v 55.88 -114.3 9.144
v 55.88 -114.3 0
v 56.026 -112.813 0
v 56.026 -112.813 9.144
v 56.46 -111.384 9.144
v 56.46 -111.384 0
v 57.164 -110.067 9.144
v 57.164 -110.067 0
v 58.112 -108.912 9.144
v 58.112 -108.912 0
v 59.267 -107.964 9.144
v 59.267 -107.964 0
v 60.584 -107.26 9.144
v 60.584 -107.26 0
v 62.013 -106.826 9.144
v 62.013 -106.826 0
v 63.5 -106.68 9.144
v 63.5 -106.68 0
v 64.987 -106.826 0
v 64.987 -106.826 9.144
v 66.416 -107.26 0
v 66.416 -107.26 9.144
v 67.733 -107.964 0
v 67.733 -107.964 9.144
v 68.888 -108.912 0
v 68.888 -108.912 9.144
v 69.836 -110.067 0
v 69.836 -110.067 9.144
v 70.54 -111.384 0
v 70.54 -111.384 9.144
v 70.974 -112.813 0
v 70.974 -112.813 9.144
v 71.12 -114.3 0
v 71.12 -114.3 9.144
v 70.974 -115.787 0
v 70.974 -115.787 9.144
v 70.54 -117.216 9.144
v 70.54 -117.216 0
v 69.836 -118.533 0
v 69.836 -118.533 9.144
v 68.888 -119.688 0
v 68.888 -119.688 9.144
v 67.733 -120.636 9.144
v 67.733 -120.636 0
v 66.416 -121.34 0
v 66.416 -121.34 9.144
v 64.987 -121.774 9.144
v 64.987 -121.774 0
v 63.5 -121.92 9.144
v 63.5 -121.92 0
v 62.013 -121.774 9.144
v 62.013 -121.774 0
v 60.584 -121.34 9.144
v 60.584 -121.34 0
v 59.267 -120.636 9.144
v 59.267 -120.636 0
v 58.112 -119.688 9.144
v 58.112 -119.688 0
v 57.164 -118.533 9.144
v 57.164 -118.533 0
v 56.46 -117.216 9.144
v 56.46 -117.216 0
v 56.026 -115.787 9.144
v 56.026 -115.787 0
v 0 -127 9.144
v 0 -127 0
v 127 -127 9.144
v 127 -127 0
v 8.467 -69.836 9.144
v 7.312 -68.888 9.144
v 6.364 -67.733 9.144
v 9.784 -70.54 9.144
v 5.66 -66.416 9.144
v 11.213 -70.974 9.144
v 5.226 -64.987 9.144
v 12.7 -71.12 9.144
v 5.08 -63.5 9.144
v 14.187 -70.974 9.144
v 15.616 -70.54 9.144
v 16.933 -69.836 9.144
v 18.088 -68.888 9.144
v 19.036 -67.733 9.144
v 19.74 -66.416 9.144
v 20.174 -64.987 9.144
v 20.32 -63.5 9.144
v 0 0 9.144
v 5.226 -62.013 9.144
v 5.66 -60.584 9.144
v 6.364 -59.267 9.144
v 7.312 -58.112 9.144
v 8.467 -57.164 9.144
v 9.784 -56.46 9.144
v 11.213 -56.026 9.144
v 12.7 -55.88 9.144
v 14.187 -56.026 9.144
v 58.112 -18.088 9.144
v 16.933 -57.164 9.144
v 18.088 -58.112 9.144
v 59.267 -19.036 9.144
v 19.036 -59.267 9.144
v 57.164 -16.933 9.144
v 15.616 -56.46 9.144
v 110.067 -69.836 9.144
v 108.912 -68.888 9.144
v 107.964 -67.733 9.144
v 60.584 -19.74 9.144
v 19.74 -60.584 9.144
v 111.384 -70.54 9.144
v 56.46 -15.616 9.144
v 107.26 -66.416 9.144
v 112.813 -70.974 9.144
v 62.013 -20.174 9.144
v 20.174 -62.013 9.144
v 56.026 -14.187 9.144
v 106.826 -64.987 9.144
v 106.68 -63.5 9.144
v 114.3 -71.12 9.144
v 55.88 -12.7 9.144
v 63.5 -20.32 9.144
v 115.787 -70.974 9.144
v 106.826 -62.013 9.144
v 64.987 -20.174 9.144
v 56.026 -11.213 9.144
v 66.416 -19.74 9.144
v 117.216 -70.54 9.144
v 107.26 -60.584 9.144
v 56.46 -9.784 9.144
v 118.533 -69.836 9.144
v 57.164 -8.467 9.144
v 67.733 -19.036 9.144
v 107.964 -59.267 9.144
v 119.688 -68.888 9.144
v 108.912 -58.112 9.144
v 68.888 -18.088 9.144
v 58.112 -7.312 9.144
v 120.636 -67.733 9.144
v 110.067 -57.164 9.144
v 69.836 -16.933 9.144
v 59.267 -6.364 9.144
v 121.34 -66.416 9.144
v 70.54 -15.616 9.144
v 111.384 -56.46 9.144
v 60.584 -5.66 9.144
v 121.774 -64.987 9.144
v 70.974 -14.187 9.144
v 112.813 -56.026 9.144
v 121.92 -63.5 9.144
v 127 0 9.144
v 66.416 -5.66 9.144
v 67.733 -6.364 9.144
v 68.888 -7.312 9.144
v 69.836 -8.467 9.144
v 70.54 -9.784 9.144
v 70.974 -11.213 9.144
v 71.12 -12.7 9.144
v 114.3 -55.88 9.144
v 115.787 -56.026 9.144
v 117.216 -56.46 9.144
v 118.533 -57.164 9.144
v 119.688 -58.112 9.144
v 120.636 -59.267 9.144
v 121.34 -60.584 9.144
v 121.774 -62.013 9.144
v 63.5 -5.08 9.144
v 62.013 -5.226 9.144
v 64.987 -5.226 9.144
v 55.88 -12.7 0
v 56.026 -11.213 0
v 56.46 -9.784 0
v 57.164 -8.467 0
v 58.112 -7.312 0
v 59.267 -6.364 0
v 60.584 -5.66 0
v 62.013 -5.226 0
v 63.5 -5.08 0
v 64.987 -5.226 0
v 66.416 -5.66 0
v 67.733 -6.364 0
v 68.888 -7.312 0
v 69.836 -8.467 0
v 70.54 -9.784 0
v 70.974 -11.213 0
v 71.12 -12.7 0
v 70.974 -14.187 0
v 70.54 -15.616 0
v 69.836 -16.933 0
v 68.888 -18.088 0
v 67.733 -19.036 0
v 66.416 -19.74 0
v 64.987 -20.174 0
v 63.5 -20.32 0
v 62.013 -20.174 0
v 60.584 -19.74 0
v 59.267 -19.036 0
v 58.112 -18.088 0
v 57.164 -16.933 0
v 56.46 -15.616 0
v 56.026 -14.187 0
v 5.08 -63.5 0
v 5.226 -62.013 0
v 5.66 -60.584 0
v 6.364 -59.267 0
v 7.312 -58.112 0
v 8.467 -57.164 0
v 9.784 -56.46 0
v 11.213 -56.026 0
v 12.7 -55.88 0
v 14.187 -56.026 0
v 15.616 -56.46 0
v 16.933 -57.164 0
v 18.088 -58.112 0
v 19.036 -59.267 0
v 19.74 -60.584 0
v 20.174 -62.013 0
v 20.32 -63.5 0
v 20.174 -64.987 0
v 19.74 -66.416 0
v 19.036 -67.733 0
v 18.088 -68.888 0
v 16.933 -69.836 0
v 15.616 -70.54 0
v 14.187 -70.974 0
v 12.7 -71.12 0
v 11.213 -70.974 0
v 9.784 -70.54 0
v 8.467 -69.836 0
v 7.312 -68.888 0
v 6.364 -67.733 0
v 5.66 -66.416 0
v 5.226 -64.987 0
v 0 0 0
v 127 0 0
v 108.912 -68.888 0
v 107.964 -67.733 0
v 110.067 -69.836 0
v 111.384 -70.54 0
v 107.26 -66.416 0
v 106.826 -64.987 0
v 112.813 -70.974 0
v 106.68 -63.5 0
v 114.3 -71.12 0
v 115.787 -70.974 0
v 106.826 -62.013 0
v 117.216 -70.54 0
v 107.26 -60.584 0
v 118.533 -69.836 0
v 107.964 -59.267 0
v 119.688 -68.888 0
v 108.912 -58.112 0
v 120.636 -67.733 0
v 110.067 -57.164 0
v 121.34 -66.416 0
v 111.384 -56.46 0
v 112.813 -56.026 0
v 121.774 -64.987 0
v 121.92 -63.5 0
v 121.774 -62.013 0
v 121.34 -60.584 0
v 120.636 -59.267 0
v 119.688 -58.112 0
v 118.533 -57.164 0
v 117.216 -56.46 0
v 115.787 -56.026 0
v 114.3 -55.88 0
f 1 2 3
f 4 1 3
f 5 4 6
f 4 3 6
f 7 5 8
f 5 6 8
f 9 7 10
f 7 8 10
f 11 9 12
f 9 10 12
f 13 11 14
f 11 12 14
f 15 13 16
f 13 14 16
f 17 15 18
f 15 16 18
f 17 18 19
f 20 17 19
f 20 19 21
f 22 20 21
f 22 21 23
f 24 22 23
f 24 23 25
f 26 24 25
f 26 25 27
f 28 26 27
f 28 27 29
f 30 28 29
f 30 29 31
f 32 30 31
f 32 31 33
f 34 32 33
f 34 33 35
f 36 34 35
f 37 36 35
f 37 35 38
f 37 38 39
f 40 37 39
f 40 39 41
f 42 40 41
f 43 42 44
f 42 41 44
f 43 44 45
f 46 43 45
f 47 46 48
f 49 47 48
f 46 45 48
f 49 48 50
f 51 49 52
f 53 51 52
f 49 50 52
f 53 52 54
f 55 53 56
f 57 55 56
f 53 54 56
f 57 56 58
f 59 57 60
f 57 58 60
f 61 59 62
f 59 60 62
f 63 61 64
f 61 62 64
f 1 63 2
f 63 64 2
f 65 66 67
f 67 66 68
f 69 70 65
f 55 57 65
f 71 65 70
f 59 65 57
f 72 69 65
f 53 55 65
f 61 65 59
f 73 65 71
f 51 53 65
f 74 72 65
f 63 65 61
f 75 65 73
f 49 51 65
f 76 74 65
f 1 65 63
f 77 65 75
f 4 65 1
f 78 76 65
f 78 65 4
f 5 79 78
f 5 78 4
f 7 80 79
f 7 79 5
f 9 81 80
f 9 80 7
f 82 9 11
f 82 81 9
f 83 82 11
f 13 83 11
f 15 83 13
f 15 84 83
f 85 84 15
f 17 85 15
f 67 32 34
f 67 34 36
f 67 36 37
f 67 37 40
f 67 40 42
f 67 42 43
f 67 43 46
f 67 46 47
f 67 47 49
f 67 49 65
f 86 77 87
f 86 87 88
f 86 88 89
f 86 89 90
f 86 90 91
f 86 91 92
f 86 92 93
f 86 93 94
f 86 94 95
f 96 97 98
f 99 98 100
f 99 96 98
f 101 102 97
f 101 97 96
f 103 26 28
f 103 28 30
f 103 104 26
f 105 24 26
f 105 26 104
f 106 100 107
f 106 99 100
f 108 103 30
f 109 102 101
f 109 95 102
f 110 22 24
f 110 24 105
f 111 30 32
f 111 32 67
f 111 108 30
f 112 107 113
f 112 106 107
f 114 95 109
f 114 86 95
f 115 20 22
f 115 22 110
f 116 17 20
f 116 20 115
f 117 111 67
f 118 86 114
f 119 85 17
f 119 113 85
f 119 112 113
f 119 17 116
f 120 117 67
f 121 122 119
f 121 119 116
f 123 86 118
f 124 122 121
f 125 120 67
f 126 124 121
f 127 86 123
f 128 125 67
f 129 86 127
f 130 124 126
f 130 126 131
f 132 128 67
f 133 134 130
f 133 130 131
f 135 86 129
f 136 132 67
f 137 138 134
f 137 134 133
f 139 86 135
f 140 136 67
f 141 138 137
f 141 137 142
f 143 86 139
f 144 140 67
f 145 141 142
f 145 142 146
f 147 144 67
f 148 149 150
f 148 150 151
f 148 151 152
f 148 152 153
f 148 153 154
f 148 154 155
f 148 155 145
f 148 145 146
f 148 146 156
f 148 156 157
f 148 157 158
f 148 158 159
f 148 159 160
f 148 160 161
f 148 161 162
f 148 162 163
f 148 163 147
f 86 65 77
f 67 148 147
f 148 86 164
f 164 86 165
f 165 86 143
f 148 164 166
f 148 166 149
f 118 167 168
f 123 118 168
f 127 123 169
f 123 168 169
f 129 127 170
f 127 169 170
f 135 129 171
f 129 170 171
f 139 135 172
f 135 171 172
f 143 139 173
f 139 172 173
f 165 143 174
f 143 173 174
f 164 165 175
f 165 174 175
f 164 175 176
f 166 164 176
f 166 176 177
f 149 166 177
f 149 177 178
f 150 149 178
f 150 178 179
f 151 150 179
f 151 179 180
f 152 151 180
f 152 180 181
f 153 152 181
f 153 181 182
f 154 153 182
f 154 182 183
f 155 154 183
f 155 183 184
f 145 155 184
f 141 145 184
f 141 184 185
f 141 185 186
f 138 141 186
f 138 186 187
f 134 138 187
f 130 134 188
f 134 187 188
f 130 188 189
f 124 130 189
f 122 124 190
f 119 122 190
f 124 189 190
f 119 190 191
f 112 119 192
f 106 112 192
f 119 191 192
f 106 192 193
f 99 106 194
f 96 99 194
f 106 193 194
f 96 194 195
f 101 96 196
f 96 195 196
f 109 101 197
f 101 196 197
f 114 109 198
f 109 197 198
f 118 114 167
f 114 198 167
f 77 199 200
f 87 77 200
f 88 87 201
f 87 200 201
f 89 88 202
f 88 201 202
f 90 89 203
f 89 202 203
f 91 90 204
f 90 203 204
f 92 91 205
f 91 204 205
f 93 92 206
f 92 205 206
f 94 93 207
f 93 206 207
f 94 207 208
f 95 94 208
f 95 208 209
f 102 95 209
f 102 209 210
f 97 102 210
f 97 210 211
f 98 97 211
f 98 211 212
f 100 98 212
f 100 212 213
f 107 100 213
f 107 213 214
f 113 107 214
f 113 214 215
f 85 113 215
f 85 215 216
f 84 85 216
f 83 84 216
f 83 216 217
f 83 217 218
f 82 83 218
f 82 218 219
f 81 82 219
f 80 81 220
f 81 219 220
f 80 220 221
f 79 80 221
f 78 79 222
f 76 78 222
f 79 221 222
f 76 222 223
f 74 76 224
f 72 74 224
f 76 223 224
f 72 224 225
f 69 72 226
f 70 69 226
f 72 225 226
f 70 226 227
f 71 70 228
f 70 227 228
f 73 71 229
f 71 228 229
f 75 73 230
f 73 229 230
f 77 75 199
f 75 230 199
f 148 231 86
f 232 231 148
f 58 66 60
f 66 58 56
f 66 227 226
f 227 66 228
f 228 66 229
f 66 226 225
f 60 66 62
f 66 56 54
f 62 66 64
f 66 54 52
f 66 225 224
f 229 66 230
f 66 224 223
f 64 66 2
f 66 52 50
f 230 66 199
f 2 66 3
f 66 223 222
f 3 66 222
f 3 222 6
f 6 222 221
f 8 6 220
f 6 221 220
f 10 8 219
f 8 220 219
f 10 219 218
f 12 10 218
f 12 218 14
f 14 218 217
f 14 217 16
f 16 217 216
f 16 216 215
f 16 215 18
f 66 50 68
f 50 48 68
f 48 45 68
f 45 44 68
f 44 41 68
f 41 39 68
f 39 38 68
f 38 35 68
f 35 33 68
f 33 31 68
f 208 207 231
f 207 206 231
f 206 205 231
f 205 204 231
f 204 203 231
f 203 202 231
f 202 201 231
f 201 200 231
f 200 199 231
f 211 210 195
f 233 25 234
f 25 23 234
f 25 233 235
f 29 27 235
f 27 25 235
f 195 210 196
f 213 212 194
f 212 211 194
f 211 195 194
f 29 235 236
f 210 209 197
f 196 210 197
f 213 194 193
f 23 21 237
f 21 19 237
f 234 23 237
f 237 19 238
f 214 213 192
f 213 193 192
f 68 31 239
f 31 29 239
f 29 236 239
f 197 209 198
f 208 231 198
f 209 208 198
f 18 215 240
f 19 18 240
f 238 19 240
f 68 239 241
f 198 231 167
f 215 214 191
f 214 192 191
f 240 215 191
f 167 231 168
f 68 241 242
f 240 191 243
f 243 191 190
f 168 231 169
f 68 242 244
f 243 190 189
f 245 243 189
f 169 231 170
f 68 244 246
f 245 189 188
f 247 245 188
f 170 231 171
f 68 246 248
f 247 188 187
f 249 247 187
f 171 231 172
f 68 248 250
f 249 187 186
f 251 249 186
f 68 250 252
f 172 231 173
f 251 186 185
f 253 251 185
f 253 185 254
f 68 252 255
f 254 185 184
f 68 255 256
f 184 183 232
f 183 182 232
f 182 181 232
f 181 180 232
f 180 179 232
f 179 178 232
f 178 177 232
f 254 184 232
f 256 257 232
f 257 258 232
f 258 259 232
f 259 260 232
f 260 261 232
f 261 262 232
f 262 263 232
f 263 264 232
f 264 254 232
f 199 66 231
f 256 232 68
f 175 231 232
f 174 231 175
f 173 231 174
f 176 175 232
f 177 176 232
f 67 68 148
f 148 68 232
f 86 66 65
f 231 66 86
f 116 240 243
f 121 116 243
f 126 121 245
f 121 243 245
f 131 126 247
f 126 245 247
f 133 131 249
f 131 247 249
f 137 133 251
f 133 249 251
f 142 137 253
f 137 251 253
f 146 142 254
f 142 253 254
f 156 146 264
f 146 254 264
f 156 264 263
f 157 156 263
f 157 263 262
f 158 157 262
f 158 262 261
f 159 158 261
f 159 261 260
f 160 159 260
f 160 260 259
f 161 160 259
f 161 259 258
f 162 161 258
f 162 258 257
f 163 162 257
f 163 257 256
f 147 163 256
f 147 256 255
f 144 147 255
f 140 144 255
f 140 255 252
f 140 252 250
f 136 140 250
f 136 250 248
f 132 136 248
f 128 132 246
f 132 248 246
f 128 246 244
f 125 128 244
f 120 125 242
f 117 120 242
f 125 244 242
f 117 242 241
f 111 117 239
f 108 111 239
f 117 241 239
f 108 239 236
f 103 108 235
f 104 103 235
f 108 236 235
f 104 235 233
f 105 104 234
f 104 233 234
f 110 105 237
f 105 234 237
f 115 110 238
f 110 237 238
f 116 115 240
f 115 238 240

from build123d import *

# Parameters (mm, degrees)
F0_W           = 127
F0_H           = 127
F1_DEPTH       = 9.144
F3_D           = 15.24
F3_CBORE_D     = 15.24
F3_CBORE_DEPTH = 50.8
F4_D           = 15.24
F4_CBORE_D     = 15.24
F4_CBORE_DEPTH = 50.8
F5_D           = 15.24
F5_CBORE_D     = 15.24
F5_CBORE_DEPTH = 50.8
F6_D           = 15.24
F6_CBORE_D     = 15.24
F6_CBORE_DEPTH = 50.8


with BuildPart() as f1:
    # F0 (on Top) → F1 (new body)
    with BuildSketch(Plane.XY):
        with Locations((63.5, -63.5)):
            Rectangle(F0_W, F0_H)
    extrude(amount=F1_DEPTH)

    # F3 (through all)
    with Locations(Plane.XY.offset(9.144)):
        with Locations((63.5, -12.7)):
            CounterBoreHole(F3_D / 2, F3_CBORE_D / 2, F3_CBORE_DEPTH)

    # F4 (through all)
    with Locations(Plane.XY.offset(9.144)):
        with Locations((12.7, -63.5)):
            CounterBoreHole(F4_D / 2, F4_CBORE_D / 2, F4_CBORE_DEPTH)

    # F5 (through all)
    with Locations(Plane.XY.offset(9.144)):
        with Locations((63.5, -114.3)):
            CounterBoreHole(F5_D / 2, F5_CBORE_D / 2, F5_CBORE_DEPTH)

    # F6 (through all)
    with Locations(Plane.XY.offset(9.144)):
        with Locations((114.3, -63.5)):
            CounterBoreHole(F6_D / 2, F6_CBORE_D / 2, F6_CBORE_DEPTH)


solid = f1.part
